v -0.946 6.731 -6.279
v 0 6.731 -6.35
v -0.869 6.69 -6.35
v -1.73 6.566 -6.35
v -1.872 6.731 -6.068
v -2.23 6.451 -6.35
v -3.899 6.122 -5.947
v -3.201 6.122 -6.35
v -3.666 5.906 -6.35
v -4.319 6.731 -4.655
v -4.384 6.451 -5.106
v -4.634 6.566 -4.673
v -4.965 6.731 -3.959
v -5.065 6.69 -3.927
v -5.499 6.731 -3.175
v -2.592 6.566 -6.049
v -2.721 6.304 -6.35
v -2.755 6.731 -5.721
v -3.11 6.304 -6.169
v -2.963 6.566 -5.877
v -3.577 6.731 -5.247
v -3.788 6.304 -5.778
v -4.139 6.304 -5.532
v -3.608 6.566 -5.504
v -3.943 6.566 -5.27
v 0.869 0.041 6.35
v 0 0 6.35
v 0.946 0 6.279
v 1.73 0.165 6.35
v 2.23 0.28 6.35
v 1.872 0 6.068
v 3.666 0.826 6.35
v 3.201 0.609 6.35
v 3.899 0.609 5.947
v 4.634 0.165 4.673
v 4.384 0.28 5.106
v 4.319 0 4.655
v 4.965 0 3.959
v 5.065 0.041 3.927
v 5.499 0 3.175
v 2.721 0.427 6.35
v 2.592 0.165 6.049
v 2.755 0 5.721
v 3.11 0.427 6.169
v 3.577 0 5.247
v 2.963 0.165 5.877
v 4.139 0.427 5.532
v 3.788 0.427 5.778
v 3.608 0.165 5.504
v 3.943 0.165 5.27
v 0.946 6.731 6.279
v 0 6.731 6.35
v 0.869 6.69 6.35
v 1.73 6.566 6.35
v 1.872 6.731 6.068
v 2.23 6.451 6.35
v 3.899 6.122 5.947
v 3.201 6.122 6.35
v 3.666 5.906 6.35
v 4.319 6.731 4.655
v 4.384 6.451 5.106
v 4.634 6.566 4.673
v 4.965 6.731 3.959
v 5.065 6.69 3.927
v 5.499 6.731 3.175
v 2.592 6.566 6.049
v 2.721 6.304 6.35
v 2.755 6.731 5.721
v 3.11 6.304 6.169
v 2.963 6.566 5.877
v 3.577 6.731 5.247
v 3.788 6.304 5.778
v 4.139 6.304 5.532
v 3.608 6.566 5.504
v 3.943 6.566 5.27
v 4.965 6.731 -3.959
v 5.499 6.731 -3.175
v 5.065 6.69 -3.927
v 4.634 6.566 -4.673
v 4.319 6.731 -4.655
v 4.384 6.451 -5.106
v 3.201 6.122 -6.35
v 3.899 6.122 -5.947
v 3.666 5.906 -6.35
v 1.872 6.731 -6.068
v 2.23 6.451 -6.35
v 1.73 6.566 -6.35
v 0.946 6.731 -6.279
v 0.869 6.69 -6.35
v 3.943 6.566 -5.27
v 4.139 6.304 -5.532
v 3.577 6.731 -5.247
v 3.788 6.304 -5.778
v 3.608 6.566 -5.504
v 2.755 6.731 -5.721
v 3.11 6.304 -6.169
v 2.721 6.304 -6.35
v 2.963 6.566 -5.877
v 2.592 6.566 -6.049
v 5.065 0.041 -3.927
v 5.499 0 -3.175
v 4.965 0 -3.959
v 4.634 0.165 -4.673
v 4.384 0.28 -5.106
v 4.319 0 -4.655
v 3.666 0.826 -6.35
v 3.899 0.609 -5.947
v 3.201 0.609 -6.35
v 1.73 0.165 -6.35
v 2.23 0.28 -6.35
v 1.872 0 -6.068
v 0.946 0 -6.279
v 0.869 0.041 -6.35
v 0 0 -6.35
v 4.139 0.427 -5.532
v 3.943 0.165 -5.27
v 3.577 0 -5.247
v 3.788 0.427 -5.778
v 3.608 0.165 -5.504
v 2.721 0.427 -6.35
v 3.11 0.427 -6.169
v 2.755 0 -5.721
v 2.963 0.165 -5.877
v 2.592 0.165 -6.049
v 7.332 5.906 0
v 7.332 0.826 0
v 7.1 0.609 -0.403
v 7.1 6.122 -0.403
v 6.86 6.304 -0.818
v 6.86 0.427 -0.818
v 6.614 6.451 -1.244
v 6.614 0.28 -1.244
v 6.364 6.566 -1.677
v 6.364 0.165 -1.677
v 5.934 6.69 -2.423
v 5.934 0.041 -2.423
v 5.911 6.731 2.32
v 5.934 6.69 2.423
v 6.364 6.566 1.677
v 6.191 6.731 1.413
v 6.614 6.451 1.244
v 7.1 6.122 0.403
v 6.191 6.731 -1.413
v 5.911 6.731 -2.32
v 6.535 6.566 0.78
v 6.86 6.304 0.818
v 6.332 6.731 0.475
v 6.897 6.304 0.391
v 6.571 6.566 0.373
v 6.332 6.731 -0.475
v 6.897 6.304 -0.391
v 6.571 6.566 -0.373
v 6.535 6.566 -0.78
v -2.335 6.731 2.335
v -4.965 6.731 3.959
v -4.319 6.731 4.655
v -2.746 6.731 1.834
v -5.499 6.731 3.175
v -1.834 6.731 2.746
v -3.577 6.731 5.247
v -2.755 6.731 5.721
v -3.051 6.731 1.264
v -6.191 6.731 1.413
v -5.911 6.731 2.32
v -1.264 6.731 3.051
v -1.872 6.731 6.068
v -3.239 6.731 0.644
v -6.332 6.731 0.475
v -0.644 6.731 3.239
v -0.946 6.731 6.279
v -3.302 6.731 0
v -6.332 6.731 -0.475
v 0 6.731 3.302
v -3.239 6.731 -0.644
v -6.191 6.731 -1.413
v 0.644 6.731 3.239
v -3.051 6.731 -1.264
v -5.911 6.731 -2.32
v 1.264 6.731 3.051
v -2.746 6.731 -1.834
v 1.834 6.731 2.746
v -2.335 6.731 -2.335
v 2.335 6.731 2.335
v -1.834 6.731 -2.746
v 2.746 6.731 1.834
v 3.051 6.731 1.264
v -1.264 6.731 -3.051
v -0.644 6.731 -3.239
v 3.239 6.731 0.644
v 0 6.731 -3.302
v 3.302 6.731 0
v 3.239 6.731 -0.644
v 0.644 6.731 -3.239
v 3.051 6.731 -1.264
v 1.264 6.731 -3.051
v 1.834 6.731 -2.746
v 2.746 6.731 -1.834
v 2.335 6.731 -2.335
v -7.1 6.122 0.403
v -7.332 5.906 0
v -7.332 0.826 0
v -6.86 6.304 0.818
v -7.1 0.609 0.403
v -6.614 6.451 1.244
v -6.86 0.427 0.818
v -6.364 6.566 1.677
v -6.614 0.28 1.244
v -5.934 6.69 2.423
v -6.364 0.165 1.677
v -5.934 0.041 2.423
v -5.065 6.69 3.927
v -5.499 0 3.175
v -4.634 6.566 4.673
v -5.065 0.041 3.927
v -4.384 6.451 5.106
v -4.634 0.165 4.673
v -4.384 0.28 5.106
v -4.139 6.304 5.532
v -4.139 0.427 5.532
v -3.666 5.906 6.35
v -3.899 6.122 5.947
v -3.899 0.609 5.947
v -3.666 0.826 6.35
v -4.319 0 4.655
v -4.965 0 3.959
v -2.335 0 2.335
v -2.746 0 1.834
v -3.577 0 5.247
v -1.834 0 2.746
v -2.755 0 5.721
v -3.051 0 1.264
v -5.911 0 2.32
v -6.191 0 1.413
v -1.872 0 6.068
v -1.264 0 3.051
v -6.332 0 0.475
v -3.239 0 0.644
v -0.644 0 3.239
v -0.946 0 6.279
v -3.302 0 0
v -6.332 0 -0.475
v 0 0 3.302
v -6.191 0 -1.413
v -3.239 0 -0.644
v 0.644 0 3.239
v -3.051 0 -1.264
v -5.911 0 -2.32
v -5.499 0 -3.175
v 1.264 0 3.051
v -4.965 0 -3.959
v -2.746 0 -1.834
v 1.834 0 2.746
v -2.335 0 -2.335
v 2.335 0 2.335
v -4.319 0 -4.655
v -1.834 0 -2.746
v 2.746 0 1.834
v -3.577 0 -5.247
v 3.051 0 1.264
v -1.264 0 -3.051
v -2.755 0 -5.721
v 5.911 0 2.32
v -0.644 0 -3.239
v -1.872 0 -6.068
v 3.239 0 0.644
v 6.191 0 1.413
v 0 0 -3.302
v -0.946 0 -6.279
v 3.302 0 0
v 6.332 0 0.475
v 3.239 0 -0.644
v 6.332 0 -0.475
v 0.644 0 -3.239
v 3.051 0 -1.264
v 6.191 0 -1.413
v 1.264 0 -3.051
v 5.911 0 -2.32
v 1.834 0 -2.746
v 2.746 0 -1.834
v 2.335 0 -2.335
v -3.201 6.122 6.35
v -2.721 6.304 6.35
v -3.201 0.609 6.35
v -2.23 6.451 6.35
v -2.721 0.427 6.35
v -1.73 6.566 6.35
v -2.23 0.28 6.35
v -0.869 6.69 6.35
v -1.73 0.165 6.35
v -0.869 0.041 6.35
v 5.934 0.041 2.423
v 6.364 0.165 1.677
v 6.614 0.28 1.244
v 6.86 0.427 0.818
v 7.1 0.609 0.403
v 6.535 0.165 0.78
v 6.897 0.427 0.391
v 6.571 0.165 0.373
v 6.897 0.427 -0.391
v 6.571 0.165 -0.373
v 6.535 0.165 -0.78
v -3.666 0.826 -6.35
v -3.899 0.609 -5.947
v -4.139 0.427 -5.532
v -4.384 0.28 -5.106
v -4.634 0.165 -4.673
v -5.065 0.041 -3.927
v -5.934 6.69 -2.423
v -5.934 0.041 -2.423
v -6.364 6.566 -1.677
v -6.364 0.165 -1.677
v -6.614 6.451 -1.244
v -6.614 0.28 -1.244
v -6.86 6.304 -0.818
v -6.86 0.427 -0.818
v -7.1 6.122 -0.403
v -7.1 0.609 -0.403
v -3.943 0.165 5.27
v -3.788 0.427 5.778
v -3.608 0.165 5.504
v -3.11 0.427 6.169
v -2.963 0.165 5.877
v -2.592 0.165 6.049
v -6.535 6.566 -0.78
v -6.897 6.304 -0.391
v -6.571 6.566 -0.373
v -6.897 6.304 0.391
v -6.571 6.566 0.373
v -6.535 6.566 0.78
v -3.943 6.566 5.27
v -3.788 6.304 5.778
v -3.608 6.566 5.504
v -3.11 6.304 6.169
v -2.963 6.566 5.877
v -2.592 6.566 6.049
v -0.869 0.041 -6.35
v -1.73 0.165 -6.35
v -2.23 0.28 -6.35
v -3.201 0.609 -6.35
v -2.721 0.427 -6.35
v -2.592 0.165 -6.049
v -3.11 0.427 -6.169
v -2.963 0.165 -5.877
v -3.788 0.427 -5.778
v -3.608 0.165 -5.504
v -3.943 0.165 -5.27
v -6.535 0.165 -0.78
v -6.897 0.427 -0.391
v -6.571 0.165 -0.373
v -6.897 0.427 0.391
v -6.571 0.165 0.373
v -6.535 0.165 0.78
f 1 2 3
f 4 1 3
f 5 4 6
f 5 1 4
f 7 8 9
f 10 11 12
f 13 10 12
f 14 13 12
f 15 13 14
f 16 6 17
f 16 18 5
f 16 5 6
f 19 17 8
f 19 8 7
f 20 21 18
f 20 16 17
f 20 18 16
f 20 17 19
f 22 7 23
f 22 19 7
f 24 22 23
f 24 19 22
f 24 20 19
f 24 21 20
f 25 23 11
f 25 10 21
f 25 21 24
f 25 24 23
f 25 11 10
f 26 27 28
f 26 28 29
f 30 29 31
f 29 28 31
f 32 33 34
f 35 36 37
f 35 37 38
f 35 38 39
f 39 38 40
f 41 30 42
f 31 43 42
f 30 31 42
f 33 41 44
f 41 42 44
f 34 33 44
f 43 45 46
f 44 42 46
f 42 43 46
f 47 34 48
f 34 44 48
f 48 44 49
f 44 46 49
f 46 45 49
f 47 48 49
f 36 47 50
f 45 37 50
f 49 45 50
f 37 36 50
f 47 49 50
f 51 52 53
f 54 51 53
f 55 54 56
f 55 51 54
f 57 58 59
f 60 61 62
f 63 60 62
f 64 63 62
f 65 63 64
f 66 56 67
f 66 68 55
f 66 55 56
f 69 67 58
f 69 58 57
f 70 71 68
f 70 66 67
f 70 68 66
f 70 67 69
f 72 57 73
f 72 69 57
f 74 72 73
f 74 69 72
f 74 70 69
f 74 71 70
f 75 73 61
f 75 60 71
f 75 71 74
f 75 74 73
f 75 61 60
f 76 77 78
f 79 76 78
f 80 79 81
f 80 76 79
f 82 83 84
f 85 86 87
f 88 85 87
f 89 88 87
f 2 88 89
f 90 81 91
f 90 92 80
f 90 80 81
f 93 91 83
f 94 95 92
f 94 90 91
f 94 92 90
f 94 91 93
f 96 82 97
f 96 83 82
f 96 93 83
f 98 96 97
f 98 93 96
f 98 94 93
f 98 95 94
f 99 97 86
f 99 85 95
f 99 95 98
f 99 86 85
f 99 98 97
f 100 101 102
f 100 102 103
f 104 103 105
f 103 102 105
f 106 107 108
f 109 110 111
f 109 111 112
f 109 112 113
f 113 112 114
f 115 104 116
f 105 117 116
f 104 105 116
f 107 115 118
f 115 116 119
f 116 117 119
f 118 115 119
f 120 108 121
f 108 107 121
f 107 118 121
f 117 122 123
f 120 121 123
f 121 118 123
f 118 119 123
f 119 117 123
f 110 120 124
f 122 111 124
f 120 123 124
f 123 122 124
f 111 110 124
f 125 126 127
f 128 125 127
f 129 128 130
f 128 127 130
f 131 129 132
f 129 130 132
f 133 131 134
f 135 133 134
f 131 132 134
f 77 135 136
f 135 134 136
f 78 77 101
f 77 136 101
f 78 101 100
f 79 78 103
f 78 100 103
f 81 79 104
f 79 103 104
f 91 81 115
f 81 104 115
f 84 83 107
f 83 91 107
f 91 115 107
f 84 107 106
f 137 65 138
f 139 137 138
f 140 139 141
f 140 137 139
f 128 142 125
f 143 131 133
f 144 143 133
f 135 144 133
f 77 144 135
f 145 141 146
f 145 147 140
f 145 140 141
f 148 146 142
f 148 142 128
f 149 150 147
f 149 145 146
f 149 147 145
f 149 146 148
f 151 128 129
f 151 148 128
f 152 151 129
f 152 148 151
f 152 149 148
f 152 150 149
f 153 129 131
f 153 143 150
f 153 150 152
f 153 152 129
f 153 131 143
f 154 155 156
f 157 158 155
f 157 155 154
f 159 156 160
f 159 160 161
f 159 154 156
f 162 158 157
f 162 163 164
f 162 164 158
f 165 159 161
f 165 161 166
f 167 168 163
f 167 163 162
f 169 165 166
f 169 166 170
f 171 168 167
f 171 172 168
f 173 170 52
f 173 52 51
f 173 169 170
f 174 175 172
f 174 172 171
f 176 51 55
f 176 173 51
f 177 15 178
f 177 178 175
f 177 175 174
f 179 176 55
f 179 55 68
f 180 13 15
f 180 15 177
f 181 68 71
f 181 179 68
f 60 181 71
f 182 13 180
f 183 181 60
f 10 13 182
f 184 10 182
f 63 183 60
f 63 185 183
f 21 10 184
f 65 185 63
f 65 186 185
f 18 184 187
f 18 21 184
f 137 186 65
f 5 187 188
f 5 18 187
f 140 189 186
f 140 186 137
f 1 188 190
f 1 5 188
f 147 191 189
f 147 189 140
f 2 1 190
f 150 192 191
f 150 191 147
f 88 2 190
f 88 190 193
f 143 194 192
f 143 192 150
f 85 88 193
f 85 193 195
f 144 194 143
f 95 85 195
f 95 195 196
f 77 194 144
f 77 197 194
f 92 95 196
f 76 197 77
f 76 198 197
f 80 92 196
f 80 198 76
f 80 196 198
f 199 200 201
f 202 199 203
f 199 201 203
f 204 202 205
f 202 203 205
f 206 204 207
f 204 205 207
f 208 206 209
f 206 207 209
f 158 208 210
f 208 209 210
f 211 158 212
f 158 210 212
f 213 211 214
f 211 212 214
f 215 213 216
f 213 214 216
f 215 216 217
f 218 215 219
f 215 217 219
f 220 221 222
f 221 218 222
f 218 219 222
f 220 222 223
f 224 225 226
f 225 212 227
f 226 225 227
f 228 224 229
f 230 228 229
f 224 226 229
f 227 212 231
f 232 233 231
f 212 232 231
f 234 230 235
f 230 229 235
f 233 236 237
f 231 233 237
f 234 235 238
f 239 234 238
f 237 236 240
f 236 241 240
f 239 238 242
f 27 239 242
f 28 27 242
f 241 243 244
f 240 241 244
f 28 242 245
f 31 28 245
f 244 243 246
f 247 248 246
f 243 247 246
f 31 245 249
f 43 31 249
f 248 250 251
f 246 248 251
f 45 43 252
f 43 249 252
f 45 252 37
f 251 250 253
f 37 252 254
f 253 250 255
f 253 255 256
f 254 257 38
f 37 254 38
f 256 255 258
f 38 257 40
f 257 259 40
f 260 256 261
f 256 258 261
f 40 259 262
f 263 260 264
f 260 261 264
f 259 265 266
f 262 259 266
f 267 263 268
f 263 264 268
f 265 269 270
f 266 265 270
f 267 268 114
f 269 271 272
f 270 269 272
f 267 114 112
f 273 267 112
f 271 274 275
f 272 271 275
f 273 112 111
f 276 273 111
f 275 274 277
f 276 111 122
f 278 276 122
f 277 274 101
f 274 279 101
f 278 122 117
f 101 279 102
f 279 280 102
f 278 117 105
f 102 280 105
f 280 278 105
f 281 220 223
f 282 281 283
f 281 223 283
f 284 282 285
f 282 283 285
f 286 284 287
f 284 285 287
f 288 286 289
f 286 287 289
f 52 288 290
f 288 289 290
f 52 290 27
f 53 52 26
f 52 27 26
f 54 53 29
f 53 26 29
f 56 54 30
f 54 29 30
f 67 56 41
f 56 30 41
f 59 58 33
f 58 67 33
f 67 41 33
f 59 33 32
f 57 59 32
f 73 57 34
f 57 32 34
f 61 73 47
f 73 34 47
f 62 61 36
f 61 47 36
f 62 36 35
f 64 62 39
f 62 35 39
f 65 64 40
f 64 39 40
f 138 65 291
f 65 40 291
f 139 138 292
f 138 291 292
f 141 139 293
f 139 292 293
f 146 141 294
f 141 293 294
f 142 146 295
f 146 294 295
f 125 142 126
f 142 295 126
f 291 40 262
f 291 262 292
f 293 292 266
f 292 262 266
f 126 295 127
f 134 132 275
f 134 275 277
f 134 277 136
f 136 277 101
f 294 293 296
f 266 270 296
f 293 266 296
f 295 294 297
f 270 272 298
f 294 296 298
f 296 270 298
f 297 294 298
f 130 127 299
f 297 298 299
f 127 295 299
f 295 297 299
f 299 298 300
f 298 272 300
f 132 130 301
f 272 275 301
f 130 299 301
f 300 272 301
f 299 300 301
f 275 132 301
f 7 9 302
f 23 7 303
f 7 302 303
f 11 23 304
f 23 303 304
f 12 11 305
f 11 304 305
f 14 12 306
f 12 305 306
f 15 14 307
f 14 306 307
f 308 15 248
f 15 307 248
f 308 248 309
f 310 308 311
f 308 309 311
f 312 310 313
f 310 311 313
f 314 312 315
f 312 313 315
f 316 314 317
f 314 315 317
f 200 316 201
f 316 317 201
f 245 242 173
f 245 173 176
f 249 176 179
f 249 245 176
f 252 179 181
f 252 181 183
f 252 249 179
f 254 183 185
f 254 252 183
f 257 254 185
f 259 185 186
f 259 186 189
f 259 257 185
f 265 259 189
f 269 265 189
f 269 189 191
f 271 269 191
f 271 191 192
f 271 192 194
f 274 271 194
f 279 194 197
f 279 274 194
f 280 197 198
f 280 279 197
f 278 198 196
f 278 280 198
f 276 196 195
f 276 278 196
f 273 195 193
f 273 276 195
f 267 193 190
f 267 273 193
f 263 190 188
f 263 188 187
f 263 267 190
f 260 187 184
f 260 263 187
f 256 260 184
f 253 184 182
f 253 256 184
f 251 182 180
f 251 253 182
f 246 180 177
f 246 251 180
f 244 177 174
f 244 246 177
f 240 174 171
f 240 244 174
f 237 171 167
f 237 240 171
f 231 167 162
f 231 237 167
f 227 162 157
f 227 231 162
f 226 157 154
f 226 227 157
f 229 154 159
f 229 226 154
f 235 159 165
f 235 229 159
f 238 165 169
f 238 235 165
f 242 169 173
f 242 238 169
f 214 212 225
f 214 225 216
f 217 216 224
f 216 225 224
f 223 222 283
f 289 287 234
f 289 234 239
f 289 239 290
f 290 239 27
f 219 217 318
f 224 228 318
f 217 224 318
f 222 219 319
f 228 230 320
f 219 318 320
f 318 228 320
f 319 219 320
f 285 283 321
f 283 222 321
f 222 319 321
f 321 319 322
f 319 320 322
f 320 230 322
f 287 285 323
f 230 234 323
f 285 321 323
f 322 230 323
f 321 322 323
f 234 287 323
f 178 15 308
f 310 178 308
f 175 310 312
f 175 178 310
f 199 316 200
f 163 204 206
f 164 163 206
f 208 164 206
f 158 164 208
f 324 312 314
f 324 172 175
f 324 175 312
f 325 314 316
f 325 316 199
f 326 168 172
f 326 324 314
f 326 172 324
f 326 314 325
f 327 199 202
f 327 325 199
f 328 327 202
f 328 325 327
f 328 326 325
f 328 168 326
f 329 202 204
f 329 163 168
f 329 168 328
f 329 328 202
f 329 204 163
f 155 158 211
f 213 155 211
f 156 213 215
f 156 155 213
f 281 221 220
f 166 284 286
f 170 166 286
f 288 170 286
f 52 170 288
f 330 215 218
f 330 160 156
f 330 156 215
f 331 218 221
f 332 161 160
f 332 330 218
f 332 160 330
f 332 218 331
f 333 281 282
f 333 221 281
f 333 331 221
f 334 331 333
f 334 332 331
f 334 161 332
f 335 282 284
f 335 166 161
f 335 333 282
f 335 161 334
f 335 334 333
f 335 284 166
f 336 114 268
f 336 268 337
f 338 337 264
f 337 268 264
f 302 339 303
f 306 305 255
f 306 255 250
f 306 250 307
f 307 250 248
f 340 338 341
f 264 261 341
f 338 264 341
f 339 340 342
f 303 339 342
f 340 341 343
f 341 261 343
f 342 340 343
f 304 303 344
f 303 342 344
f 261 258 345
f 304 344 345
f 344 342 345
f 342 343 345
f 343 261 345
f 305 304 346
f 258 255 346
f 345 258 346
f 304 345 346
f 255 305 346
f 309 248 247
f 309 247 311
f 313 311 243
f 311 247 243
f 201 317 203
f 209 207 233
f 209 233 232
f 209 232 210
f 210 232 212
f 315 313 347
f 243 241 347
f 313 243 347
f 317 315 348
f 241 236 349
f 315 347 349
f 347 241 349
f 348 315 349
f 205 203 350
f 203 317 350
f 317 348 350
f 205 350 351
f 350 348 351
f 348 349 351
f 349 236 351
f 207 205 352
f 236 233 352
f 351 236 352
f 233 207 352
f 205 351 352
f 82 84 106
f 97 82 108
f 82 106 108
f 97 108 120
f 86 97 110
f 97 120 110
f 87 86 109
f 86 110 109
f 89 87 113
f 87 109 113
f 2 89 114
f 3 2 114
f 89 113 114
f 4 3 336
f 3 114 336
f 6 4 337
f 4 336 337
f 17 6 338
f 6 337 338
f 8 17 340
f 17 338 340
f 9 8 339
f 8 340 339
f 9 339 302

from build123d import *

# Parameters (mm, degrees)
SKETCH1_R      = 3.302
EXTRUDE1_DEPTH = 6.731


with BuildPart() as part:
    # Sketch1 → Extrude1 (new body)
    with BuildSketch(Plane(origin=(0, 0, 0), x_dir=(1, 0, 0), z_dir=(0, 1, 0))):
        Polygon((7.332348419, 0), (3.666174209, 6.35), (-3.666174209, 6.35), (-7.332348419, 0), (-3.666174209, -6.35), (3.666174209, -6.35), align=None)
        with Locations(Location((0, 0, 0), (0, 0, 270))):
            Circle(SKETCH1_R, mode=Mode.SUBTRACT)
    extrude(amount=EXTRUDE1_DEPTH)

    # Sketch2 → Cut-Revolve1 (revolve, cut)
    with BuildSketch(Plane.XY):
        with BuildLine():
            Line((6.35, 6.731), (7.332348419, 6.731))
            Line((7.332348419, 6.731), (7.332348419, 5.9055))
            ThreePointArc((7.332348419, 5.9055), (6.862078786, 6.343126533), (6.35, 6.731))
        make_face()
        with BuildLine():
            Line((7.332348419, 0), (7.332348419, 0.8255))
            ThreePointArc((7.332348419, 0.8255), (6.862078786, 0.387873467), (6.35, 0))
            Line((6.35, 0), (7.332348419, 0))
        make_face()
    revolve(axis=Axis((0, 0, 0), (0, 1, 0)), mode=Mode.SUBTRACT)


solid = part.part
